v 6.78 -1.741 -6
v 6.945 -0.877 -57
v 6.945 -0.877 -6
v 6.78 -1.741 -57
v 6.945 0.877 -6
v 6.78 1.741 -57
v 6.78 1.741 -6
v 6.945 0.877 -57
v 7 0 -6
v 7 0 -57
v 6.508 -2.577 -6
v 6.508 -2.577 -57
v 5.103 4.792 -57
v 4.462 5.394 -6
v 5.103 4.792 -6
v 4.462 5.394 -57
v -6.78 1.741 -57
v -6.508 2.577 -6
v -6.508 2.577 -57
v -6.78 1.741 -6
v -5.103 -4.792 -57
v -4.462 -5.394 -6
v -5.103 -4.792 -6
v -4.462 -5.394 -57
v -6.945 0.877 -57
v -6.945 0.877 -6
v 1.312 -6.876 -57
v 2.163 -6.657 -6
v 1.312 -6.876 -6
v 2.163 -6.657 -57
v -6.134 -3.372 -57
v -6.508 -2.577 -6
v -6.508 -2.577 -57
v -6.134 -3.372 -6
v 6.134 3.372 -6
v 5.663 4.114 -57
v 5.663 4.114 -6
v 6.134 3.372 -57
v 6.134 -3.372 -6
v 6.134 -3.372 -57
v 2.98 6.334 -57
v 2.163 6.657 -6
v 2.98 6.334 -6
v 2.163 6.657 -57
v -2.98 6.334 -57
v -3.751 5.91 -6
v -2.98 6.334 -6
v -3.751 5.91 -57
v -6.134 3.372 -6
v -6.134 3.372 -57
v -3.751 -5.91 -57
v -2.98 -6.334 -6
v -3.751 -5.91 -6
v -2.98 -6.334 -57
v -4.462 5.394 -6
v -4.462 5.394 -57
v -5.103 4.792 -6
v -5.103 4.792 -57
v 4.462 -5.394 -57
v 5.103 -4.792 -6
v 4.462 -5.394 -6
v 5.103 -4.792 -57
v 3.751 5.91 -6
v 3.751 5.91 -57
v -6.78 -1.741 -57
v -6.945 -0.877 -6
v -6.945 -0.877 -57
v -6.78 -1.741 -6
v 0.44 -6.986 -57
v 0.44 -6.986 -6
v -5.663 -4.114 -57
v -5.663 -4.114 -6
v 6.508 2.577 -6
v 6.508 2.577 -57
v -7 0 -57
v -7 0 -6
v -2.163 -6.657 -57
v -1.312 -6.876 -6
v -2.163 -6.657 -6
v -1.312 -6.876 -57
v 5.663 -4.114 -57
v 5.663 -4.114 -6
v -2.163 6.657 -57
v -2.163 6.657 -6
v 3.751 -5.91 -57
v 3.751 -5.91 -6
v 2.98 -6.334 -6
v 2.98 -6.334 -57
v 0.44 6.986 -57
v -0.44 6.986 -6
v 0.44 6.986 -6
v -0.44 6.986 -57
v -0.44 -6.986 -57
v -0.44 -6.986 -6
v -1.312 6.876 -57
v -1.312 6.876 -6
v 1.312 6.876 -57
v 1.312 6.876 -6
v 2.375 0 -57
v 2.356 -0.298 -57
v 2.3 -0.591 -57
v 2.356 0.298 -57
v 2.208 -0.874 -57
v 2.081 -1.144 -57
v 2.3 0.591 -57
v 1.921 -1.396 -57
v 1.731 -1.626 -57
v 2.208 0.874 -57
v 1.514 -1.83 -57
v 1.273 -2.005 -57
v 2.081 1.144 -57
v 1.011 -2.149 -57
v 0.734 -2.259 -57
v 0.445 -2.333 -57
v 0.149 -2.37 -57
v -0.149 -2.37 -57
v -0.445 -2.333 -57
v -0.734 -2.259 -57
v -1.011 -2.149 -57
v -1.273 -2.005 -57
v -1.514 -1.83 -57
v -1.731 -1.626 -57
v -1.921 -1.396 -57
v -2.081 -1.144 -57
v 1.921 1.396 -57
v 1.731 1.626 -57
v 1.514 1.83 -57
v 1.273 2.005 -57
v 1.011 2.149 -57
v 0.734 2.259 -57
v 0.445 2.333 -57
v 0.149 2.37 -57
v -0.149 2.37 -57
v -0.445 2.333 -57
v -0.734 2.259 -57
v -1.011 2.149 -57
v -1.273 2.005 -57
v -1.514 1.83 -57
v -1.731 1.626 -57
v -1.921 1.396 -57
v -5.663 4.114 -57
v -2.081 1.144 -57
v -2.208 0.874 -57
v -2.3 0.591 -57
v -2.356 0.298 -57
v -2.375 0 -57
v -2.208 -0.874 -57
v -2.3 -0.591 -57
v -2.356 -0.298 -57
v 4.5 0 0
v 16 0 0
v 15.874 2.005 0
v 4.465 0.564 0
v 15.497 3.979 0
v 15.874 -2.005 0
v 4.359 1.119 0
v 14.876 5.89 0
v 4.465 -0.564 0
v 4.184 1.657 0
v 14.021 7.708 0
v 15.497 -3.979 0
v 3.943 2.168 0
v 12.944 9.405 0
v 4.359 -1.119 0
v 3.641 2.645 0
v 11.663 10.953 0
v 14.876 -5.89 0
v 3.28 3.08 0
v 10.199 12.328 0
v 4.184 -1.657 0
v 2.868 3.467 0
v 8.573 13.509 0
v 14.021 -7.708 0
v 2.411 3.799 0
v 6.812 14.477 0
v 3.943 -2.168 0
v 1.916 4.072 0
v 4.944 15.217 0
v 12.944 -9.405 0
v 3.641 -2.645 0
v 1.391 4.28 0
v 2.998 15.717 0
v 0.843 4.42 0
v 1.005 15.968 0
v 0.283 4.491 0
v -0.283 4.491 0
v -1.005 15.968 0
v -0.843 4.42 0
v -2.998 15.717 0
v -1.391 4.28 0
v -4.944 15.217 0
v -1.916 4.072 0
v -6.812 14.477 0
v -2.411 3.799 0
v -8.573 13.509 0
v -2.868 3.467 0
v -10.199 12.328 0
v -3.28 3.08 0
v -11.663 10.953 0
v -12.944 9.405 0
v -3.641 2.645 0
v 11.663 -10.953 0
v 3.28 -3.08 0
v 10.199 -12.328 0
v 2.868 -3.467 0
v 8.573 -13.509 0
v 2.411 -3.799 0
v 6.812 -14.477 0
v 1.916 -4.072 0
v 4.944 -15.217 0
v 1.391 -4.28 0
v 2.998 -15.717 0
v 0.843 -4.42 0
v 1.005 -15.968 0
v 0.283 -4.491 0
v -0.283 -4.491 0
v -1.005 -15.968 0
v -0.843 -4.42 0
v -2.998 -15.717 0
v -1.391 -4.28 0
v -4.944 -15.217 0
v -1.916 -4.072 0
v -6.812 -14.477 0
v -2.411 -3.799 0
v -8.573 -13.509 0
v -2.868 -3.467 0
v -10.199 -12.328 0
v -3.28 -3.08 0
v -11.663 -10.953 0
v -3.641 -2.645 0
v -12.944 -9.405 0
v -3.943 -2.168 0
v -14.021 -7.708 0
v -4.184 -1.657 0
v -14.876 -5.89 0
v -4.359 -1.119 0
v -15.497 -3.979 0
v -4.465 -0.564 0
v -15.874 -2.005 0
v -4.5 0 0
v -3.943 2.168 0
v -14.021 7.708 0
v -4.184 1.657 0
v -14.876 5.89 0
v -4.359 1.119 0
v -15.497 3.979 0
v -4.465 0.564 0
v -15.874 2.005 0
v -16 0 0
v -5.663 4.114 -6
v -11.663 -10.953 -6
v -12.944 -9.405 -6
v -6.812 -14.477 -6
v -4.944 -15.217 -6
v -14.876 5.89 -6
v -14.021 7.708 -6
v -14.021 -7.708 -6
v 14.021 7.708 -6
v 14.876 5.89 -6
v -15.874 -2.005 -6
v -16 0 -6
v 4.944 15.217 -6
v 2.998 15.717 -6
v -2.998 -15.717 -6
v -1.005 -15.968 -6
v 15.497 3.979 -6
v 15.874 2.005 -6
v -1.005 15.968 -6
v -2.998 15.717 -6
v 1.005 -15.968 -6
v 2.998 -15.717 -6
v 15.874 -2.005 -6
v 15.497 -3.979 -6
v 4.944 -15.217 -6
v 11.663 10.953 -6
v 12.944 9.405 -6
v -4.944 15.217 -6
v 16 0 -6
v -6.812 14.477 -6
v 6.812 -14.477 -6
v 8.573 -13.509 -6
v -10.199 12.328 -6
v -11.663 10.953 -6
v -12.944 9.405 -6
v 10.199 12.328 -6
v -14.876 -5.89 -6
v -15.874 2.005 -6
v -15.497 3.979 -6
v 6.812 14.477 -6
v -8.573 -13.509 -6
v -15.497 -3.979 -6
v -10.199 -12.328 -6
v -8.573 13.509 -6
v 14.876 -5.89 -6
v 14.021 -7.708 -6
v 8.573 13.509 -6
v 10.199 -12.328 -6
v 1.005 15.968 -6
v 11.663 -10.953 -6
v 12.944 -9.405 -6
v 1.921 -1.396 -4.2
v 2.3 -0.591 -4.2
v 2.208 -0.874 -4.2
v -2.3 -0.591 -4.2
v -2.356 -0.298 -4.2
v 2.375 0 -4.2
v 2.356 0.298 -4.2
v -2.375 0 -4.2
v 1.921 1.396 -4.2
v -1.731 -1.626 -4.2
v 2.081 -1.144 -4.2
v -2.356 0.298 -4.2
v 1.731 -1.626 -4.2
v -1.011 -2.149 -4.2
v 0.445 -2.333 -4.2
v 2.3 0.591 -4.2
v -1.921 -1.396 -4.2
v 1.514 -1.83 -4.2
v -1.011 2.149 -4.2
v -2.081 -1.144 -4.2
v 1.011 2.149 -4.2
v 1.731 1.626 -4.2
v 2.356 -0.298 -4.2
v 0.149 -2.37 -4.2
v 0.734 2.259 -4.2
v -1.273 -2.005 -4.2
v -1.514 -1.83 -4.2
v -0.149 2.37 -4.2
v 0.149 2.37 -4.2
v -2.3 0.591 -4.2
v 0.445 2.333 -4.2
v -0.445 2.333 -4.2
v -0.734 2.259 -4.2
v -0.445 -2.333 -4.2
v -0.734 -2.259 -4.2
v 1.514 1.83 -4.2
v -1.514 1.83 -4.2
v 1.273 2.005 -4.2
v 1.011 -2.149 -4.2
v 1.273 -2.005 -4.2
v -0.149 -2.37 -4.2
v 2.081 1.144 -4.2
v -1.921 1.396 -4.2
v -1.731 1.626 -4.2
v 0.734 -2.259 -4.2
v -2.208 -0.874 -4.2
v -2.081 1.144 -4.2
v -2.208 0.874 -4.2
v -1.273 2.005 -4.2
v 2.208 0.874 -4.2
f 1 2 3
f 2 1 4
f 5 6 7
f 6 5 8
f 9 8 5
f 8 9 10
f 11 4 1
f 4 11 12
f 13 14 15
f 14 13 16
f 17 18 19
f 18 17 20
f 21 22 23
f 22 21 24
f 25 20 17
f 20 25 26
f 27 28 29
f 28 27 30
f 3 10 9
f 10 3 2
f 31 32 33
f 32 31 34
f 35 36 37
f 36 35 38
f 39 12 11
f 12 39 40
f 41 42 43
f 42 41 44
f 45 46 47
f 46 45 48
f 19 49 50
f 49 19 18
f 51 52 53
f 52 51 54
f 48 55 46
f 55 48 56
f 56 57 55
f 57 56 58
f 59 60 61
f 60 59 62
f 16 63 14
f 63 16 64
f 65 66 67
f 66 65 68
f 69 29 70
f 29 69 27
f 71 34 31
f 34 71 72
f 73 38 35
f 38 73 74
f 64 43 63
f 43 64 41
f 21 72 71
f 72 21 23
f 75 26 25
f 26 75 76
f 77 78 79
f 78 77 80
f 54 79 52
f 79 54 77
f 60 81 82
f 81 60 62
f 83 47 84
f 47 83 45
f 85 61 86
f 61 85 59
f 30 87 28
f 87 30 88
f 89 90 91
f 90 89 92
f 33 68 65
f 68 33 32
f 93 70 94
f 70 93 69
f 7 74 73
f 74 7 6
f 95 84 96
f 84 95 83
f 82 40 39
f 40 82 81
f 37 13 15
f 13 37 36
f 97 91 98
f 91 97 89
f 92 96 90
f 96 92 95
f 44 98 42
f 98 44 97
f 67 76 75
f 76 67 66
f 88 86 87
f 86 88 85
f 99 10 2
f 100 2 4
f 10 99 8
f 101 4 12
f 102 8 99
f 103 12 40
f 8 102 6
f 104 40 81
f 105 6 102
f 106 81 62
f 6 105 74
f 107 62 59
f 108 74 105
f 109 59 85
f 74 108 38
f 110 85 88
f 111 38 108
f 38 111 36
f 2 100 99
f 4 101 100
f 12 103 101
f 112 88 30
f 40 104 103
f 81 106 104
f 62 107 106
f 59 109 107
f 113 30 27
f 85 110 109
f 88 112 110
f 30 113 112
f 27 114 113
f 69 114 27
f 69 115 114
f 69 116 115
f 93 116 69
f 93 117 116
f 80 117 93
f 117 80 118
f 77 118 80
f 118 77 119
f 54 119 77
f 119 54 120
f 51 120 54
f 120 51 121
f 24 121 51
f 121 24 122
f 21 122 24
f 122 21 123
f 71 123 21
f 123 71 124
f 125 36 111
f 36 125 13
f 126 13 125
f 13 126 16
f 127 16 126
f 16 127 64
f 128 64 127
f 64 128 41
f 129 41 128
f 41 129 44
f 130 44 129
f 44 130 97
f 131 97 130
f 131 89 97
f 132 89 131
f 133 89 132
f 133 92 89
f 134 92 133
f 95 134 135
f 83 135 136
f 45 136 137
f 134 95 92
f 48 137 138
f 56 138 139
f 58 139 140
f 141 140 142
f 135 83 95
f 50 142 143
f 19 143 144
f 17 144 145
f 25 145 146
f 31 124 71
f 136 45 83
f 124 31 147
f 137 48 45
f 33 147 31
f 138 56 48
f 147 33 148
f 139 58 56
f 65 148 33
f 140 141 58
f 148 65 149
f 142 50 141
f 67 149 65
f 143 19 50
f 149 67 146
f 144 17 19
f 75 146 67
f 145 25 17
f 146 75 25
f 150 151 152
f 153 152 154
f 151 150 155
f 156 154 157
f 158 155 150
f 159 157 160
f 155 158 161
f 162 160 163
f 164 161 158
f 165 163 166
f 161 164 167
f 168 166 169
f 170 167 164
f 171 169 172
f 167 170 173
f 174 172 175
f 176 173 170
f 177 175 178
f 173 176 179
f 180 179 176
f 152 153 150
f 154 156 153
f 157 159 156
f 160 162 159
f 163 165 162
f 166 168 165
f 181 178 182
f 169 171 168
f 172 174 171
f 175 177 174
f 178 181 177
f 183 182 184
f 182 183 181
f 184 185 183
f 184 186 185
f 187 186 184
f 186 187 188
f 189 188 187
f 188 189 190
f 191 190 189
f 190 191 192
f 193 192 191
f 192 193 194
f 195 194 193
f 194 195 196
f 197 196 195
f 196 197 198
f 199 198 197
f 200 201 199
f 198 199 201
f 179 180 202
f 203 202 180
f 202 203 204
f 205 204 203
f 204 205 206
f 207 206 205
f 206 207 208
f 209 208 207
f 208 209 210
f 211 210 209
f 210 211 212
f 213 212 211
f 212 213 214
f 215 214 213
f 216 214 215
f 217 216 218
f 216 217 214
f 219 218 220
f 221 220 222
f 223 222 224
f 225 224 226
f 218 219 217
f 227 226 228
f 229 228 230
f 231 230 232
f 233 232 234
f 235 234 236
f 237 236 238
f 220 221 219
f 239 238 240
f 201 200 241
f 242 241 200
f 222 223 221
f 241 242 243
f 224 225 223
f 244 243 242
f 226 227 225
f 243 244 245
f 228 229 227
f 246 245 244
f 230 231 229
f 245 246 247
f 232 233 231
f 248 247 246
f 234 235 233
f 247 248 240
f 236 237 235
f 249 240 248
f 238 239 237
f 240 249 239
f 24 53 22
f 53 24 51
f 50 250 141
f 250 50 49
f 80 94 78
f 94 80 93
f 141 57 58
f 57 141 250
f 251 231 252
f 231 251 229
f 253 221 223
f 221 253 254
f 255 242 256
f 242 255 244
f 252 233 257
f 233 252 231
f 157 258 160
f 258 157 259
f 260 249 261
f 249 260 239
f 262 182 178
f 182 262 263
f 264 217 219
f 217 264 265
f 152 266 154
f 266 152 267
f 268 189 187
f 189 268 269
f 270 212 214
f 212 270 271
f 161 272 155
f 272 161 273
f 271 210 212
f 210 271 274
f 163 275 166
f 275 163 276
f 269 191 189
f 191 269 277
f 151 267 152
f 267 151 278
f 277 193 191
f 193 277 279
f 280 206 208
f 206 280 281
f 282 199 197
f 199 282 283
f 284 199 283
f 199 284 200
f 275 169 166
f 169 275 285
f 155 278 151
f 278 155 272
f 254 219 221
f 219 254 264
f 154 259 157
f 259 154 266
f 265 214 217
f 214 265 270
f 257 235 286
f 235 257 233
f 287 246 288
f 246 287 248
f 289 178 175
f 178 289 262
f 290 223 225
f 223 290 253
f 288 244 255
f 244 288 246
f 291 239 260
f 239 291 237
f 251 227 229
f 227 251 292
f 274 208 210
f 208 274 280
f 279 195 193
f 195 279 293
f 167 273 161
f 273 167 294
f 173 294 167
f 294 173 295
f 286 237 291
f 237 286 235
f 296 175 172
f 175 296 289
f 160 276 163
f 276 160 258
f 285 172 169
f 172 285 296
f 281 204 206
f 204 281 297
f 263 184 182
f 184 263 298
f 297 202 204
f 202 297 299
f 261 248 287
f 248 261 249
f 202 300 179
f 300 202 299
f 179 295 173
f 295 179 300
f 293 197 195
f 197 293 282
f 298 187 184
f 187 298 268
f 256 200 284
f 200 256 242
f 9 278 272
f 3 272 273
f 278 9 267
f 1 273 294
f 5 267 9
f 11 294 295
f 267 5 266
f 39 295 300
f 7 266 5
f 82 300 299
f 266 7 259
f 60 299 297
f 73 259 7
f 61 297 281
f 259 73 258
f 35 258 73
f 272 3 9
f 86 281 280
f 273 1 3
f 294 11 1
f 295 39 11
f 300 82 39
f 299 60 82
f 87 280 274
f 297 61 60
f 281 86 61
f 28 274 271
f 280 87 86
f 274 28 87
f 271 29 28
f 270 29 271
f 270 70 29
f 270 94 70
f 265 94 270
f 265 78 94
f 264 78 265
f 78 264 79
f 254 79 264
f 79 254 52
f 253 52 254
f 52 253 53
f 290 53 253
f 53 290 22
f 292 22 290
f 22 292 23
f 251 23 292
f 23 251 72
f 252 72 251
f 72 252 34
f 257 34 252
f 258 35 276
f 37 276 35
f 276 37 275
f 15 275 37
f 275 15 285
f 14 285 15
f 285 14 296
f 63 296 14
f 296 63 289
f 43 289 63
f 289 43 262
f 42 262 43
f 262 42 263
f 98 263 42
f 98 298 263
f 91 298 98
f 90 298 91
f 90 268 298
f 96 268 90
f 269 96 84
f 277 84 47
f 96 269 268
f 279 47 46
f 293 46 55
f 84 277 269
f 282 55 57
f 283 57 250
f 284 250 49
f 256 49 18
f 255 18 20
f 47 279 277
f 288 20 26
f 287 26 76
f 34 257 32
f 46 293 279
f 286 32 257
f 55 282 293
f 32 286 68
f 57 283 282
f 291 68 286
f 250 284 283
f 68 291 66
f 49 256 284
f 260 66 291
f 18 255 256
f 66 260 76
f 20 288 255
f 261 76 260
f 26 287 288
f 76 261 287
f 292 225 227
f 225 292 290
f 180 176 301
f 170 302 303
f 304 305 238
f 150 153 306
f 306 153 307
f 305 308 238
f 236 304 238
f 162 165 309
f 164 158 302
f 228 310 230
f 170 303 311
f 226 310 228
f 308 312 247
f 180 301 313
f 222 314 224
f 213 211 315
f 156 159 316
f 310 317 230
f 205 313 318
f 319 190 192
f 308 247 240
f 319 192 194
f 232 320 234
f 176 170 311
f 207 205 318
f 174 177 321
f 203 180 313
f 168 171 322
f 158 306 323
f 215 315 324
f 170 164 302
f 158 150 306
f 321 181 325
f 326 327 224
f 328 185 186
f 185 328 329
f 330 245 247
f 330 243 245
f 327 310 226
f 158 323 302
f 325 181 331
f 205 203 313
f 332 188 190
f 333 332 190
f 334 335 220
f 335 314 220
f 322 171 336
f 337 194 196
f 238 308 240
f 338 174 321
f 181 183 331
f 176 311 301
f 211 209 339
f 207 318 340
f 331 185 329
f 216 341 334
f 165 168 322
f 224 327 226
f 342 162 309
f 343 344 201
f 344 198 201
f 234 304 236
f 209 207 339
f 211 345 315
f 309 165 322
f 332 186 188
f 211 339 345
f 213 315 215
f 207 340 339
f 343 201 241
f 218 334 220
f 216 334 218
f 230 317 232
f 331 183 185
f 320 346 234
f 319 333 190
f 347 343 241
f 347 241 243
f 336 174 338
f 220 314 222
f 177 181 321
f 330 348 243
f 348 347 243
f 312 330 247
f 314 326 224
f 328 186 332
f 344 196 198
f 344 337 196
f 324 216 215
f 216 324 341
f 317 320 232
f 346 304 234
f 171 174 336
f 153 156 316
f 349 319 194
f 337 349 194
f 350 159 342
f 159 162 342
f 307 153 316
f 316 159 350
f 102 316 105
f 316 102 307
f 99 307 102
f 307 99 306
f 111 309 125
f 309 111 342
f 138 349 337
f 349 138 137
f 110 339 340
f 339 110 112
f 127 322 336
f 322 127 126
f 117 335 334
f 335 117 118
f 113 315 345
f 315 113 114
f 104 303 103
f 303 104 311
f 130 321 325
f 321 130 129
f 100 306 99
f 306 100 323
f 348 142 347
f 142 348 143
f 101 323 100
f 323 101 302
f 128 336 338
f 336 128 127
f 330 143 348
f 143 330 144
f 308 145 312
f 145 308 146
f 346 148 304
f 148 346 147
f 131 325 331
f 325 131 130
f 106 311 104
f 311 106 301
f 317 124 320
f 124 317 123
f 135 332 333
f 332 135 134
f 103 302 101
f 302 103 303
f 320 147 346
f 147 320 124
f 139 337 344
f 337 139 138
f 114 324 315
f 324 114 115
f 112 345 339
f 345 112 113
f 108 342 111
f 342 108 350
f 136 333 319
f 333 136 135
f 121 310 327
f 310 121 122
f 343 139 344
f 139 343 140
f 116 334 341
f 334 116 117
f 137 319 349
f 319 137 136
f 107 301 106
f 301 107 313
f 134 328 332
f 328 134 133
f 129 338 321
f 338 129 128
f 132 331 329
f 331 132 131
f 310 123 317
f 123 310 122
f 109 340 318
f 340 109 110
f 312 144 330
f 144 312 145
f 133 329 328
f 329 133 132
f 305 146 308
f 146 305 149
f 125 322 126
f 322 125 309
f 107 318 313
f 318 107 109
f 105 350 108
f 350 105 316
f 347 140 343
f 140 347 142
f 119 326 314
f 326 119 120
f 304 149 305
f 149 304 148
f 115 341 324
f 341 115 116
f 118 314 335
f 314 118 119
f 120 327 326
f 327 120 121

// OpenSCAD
$fn = 50;


difference() {
	union() {
		translate(v = [0, 0, -57.0000000000]) {
			cylinder(h = 57, r = 7.0000000000);
		}
		translate(v = [0, 0, -6.0000000000]) {
			cylinder(h = 6, r = 16.0000000000);
		}
	}
	union() {
		translate(v = [0, 0, 0]) {
			rotate(a = [0, 0, 0]) {
				difference() {
					union() {
						#translate(v = [0, 0, -57.0000000000]) {
							cylinder(h = 57, r = 2.2500000000);
						}
						#translate(v = [0, 0, -4.2000000000]) {
							cylinder(h = 4.2000000000, r1 = 2.3750000000, r2 = 4.5000000000);
						}
						#translate(v = [0, 0, -57.0000000000]) {
							cylinder(h = 57, r = 2.3750000000);
						}
						#translate(v = [0, 0, -57.0000000000]) {
							cylinder(h = 57, r = 2.2500000000);
						}
					}
					union();
				}
			}
		}
	}
}
